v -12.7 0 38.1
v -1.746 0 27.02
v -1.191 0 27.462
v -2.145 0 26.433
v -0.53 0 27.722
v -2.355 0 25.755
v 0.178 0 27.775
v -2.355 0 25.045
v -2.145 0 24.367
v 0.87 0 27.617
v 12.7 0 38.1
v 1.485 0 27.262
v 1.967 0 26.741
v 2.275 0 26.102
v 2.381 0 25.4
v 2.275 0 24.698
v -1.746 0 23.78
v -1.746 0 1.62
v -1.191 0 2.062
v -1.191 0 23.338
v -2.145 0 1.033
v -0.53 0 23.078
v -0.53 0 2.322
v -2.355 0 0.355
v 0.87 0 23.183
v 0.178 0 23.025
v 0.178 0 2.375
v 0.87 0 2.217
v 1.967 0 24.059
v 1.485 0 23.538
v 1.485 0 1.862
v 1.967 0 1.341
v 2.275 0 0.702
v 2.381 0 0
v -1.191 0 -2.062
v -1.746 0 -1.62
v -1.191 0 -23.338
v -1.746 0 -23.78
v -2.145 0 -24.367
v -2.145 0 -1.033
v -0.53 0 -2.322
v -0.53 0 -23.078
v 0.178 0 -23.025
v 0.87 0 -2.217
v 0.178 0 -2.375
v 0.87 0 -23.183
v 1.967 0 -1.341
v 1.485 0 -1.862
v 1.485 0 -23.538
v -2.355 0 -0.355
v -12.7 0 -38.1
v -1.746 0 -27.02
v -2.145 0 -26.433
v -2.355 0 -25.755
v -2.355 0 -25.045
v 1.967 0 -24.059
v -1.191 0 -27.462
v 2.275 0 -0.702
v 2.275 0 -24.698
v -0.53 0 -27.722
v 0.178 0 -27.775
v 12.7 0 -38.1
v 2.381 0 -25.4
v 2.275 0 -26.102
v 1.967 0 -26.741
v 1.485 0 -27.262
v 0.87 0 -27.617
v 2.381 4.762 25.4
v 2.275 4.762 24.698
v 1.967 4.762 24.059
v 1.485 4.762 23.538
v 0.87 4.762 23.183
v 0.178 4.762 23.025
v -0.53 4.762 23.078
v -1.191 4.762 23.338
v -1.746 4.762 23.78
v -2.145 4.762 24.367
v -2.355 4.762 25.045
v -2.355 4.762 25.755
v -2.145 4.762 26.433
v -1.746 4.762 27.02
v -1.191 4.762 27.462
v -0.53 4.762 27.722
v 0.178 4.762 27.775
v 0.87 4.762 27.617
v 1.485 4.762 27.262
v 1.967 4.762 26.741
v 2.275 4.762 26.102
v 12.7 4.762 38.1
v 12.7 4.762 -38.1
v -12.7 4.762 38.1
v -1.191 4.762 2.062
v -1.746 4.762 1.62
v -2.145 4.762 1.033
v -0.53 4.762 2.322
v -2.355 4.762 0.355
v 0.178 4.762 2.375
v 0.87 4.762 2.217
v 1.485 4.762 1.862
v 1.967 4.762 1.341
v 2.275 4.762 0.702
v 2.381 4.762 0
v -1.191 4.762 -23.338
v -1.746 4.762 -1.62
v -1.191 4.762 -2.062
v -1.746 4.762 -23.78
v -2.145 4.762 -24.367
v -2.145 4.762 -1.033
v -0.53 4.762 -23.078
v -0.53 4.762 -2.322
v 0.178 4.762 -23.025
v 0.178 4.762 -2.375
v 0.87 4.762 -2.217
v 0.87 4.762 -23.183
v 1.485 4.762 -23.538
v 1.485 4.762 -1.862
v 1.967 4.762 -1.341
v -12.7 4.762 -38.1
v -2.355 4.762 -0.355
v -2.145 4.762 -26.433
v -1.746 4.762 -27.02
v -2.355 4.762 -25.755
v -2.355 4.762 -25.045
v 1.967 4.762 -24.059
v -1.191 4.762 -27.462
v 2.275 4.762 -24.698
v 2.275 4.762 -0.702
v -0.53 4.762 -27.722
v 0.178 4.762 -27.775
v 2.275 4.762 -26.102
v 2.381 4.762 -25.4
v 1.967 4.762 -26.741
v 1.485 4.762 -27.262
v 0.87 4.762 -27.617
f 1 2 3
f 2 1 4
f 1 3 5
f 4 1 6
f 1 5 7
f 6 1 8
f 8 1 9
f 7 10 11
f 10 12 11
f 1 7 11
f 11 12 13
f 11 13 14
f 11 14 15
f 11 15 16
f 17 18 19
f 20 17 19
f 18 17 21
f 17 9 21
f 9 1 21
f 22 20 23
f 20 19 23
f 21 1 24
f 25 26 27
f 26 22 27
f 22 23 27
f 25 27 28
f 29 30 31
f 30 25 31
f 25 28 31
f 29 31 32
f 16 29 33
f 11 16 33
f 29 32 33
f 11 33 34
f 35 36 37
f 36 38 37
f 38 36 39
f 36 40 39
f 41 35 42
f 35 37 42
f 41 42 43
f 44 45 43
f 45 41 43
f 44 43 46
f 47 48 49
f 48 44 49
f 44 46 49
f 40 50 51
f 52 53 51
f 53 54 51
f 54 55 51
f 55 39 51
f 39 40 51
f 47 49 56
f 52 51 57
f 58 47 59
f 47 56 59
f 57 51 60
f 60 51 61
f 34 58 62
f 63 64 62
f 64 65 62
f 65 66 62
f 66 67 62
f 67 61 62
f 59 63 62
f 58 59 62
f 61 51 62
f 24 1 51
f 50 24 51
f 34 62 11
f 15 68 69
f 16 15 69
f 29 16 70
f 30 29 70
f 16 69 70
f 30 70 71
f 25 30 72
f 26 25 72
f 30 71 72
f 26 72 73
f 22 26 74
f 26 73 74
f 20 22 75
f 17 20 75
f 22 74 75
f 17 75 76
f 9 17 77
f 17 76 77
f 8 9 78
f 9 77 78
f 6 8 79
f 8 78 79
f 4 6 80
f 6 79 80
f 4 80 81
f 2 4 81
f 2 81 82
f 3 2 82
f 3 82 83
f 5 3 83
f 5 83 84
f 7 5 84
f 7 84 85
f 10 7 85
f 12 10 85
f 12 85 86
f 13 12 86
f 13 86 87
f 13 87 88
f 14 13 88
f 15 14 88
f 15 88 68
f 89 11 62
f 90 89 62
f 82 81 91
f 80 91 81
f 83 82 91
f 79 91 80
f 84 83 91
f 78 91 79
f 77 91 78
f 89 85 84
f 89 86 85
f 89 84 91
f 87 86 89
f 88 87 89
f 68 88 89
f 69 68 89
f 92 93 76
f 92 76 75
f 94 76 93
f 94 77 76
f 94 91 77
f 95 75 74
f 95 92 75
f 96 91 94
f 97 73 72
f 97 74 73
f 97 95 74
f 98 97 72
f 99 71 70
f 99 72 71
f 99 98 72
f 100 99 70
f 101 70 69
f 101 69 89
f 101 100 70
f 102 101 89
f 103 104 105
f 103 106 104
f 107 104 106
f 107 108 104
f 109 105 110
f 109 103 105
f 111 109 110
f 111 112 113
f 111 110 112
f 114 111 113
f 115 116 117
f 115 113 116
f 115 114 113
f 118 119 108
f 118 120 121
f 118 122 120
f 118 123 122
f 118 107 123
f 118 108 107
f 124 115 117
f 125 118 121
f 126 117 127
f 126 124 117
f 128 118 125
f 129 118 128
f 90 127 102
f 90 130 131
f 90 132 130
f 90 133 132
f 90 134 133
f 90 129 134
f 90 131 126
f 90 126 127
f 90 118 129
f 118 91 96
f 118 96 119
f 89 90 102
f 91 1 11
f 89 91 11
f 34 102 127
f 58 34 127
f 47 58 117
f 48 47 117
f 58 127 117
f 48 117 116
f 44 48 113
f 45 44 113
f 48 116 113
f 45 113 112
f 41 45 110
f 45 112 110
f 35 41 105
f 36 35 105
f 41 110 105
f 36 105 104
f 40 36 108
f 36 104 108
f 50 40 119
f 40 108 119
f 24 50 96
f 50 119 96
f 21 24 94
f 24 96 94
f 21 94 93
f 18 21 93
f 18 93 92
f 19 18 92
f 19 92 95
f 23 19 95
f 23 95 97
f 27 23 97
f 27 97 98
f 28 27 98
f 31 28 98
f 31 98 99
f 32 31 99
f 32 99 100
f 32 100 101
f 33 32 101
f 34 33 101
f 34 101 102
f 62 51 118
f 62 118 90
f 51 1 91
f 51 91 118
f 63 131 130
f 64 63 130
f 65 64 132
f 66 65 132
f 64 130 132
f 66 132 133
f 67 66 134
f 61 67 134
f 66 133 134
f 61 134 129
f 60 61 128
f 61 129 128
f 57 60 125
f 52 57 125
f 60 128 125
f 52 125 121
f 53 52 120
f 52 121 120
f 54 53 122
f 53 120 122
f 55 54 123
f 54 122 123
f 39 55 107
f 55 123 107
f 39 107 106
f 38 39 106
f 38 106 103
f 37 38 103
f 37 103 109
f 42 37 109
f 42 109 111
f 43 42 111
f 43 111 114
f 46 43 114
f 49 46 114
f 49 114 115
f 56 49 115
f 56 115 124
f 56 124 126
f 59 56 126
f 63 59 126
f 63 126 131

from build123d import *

# Parameters (mm, degrees)
SKETCH1_W           = 25.4
SKETCH1_H           = 76.2
BOSS_EXTRUDE1_DEPTH = 4.7625
SKETCH2_R           = 2.38125
CUT_EXTRUDE1_DEPTH  = 5.7625


with BuildPart() as part:
    # Sketch1 → Boss-Extrude1 (new body)
    with BuildSketch(Plane(origin=(0, 0, 0), x_dir=(1, 0, 0), z_dir=(0, 1, 0))):
        Rectangle(SKETCH1_W, SKETCH1_H)
    extrude(amount=BOSS_EXTRUDE1_DEPTH)

    # Sketch2 → Cut-Extrude1 (cut, through all)
    with BuildSketch(Plane(origin=(0, 4.7625, 0), x_dir=(1, 0, 0), z_dir=(0, 1, 0))):
        with Locations((0, 25.4)):
            Circle(SKETCH2_R)
        Circle(SKETCH2_R)
        with Locations((0, -25.4)):
            Circle(SKETCH2_R)
    extrude(amount=-CUT_EXTRUDE1_DEPTH, mode=Mode.SUBTRACT)


solid = part.part
